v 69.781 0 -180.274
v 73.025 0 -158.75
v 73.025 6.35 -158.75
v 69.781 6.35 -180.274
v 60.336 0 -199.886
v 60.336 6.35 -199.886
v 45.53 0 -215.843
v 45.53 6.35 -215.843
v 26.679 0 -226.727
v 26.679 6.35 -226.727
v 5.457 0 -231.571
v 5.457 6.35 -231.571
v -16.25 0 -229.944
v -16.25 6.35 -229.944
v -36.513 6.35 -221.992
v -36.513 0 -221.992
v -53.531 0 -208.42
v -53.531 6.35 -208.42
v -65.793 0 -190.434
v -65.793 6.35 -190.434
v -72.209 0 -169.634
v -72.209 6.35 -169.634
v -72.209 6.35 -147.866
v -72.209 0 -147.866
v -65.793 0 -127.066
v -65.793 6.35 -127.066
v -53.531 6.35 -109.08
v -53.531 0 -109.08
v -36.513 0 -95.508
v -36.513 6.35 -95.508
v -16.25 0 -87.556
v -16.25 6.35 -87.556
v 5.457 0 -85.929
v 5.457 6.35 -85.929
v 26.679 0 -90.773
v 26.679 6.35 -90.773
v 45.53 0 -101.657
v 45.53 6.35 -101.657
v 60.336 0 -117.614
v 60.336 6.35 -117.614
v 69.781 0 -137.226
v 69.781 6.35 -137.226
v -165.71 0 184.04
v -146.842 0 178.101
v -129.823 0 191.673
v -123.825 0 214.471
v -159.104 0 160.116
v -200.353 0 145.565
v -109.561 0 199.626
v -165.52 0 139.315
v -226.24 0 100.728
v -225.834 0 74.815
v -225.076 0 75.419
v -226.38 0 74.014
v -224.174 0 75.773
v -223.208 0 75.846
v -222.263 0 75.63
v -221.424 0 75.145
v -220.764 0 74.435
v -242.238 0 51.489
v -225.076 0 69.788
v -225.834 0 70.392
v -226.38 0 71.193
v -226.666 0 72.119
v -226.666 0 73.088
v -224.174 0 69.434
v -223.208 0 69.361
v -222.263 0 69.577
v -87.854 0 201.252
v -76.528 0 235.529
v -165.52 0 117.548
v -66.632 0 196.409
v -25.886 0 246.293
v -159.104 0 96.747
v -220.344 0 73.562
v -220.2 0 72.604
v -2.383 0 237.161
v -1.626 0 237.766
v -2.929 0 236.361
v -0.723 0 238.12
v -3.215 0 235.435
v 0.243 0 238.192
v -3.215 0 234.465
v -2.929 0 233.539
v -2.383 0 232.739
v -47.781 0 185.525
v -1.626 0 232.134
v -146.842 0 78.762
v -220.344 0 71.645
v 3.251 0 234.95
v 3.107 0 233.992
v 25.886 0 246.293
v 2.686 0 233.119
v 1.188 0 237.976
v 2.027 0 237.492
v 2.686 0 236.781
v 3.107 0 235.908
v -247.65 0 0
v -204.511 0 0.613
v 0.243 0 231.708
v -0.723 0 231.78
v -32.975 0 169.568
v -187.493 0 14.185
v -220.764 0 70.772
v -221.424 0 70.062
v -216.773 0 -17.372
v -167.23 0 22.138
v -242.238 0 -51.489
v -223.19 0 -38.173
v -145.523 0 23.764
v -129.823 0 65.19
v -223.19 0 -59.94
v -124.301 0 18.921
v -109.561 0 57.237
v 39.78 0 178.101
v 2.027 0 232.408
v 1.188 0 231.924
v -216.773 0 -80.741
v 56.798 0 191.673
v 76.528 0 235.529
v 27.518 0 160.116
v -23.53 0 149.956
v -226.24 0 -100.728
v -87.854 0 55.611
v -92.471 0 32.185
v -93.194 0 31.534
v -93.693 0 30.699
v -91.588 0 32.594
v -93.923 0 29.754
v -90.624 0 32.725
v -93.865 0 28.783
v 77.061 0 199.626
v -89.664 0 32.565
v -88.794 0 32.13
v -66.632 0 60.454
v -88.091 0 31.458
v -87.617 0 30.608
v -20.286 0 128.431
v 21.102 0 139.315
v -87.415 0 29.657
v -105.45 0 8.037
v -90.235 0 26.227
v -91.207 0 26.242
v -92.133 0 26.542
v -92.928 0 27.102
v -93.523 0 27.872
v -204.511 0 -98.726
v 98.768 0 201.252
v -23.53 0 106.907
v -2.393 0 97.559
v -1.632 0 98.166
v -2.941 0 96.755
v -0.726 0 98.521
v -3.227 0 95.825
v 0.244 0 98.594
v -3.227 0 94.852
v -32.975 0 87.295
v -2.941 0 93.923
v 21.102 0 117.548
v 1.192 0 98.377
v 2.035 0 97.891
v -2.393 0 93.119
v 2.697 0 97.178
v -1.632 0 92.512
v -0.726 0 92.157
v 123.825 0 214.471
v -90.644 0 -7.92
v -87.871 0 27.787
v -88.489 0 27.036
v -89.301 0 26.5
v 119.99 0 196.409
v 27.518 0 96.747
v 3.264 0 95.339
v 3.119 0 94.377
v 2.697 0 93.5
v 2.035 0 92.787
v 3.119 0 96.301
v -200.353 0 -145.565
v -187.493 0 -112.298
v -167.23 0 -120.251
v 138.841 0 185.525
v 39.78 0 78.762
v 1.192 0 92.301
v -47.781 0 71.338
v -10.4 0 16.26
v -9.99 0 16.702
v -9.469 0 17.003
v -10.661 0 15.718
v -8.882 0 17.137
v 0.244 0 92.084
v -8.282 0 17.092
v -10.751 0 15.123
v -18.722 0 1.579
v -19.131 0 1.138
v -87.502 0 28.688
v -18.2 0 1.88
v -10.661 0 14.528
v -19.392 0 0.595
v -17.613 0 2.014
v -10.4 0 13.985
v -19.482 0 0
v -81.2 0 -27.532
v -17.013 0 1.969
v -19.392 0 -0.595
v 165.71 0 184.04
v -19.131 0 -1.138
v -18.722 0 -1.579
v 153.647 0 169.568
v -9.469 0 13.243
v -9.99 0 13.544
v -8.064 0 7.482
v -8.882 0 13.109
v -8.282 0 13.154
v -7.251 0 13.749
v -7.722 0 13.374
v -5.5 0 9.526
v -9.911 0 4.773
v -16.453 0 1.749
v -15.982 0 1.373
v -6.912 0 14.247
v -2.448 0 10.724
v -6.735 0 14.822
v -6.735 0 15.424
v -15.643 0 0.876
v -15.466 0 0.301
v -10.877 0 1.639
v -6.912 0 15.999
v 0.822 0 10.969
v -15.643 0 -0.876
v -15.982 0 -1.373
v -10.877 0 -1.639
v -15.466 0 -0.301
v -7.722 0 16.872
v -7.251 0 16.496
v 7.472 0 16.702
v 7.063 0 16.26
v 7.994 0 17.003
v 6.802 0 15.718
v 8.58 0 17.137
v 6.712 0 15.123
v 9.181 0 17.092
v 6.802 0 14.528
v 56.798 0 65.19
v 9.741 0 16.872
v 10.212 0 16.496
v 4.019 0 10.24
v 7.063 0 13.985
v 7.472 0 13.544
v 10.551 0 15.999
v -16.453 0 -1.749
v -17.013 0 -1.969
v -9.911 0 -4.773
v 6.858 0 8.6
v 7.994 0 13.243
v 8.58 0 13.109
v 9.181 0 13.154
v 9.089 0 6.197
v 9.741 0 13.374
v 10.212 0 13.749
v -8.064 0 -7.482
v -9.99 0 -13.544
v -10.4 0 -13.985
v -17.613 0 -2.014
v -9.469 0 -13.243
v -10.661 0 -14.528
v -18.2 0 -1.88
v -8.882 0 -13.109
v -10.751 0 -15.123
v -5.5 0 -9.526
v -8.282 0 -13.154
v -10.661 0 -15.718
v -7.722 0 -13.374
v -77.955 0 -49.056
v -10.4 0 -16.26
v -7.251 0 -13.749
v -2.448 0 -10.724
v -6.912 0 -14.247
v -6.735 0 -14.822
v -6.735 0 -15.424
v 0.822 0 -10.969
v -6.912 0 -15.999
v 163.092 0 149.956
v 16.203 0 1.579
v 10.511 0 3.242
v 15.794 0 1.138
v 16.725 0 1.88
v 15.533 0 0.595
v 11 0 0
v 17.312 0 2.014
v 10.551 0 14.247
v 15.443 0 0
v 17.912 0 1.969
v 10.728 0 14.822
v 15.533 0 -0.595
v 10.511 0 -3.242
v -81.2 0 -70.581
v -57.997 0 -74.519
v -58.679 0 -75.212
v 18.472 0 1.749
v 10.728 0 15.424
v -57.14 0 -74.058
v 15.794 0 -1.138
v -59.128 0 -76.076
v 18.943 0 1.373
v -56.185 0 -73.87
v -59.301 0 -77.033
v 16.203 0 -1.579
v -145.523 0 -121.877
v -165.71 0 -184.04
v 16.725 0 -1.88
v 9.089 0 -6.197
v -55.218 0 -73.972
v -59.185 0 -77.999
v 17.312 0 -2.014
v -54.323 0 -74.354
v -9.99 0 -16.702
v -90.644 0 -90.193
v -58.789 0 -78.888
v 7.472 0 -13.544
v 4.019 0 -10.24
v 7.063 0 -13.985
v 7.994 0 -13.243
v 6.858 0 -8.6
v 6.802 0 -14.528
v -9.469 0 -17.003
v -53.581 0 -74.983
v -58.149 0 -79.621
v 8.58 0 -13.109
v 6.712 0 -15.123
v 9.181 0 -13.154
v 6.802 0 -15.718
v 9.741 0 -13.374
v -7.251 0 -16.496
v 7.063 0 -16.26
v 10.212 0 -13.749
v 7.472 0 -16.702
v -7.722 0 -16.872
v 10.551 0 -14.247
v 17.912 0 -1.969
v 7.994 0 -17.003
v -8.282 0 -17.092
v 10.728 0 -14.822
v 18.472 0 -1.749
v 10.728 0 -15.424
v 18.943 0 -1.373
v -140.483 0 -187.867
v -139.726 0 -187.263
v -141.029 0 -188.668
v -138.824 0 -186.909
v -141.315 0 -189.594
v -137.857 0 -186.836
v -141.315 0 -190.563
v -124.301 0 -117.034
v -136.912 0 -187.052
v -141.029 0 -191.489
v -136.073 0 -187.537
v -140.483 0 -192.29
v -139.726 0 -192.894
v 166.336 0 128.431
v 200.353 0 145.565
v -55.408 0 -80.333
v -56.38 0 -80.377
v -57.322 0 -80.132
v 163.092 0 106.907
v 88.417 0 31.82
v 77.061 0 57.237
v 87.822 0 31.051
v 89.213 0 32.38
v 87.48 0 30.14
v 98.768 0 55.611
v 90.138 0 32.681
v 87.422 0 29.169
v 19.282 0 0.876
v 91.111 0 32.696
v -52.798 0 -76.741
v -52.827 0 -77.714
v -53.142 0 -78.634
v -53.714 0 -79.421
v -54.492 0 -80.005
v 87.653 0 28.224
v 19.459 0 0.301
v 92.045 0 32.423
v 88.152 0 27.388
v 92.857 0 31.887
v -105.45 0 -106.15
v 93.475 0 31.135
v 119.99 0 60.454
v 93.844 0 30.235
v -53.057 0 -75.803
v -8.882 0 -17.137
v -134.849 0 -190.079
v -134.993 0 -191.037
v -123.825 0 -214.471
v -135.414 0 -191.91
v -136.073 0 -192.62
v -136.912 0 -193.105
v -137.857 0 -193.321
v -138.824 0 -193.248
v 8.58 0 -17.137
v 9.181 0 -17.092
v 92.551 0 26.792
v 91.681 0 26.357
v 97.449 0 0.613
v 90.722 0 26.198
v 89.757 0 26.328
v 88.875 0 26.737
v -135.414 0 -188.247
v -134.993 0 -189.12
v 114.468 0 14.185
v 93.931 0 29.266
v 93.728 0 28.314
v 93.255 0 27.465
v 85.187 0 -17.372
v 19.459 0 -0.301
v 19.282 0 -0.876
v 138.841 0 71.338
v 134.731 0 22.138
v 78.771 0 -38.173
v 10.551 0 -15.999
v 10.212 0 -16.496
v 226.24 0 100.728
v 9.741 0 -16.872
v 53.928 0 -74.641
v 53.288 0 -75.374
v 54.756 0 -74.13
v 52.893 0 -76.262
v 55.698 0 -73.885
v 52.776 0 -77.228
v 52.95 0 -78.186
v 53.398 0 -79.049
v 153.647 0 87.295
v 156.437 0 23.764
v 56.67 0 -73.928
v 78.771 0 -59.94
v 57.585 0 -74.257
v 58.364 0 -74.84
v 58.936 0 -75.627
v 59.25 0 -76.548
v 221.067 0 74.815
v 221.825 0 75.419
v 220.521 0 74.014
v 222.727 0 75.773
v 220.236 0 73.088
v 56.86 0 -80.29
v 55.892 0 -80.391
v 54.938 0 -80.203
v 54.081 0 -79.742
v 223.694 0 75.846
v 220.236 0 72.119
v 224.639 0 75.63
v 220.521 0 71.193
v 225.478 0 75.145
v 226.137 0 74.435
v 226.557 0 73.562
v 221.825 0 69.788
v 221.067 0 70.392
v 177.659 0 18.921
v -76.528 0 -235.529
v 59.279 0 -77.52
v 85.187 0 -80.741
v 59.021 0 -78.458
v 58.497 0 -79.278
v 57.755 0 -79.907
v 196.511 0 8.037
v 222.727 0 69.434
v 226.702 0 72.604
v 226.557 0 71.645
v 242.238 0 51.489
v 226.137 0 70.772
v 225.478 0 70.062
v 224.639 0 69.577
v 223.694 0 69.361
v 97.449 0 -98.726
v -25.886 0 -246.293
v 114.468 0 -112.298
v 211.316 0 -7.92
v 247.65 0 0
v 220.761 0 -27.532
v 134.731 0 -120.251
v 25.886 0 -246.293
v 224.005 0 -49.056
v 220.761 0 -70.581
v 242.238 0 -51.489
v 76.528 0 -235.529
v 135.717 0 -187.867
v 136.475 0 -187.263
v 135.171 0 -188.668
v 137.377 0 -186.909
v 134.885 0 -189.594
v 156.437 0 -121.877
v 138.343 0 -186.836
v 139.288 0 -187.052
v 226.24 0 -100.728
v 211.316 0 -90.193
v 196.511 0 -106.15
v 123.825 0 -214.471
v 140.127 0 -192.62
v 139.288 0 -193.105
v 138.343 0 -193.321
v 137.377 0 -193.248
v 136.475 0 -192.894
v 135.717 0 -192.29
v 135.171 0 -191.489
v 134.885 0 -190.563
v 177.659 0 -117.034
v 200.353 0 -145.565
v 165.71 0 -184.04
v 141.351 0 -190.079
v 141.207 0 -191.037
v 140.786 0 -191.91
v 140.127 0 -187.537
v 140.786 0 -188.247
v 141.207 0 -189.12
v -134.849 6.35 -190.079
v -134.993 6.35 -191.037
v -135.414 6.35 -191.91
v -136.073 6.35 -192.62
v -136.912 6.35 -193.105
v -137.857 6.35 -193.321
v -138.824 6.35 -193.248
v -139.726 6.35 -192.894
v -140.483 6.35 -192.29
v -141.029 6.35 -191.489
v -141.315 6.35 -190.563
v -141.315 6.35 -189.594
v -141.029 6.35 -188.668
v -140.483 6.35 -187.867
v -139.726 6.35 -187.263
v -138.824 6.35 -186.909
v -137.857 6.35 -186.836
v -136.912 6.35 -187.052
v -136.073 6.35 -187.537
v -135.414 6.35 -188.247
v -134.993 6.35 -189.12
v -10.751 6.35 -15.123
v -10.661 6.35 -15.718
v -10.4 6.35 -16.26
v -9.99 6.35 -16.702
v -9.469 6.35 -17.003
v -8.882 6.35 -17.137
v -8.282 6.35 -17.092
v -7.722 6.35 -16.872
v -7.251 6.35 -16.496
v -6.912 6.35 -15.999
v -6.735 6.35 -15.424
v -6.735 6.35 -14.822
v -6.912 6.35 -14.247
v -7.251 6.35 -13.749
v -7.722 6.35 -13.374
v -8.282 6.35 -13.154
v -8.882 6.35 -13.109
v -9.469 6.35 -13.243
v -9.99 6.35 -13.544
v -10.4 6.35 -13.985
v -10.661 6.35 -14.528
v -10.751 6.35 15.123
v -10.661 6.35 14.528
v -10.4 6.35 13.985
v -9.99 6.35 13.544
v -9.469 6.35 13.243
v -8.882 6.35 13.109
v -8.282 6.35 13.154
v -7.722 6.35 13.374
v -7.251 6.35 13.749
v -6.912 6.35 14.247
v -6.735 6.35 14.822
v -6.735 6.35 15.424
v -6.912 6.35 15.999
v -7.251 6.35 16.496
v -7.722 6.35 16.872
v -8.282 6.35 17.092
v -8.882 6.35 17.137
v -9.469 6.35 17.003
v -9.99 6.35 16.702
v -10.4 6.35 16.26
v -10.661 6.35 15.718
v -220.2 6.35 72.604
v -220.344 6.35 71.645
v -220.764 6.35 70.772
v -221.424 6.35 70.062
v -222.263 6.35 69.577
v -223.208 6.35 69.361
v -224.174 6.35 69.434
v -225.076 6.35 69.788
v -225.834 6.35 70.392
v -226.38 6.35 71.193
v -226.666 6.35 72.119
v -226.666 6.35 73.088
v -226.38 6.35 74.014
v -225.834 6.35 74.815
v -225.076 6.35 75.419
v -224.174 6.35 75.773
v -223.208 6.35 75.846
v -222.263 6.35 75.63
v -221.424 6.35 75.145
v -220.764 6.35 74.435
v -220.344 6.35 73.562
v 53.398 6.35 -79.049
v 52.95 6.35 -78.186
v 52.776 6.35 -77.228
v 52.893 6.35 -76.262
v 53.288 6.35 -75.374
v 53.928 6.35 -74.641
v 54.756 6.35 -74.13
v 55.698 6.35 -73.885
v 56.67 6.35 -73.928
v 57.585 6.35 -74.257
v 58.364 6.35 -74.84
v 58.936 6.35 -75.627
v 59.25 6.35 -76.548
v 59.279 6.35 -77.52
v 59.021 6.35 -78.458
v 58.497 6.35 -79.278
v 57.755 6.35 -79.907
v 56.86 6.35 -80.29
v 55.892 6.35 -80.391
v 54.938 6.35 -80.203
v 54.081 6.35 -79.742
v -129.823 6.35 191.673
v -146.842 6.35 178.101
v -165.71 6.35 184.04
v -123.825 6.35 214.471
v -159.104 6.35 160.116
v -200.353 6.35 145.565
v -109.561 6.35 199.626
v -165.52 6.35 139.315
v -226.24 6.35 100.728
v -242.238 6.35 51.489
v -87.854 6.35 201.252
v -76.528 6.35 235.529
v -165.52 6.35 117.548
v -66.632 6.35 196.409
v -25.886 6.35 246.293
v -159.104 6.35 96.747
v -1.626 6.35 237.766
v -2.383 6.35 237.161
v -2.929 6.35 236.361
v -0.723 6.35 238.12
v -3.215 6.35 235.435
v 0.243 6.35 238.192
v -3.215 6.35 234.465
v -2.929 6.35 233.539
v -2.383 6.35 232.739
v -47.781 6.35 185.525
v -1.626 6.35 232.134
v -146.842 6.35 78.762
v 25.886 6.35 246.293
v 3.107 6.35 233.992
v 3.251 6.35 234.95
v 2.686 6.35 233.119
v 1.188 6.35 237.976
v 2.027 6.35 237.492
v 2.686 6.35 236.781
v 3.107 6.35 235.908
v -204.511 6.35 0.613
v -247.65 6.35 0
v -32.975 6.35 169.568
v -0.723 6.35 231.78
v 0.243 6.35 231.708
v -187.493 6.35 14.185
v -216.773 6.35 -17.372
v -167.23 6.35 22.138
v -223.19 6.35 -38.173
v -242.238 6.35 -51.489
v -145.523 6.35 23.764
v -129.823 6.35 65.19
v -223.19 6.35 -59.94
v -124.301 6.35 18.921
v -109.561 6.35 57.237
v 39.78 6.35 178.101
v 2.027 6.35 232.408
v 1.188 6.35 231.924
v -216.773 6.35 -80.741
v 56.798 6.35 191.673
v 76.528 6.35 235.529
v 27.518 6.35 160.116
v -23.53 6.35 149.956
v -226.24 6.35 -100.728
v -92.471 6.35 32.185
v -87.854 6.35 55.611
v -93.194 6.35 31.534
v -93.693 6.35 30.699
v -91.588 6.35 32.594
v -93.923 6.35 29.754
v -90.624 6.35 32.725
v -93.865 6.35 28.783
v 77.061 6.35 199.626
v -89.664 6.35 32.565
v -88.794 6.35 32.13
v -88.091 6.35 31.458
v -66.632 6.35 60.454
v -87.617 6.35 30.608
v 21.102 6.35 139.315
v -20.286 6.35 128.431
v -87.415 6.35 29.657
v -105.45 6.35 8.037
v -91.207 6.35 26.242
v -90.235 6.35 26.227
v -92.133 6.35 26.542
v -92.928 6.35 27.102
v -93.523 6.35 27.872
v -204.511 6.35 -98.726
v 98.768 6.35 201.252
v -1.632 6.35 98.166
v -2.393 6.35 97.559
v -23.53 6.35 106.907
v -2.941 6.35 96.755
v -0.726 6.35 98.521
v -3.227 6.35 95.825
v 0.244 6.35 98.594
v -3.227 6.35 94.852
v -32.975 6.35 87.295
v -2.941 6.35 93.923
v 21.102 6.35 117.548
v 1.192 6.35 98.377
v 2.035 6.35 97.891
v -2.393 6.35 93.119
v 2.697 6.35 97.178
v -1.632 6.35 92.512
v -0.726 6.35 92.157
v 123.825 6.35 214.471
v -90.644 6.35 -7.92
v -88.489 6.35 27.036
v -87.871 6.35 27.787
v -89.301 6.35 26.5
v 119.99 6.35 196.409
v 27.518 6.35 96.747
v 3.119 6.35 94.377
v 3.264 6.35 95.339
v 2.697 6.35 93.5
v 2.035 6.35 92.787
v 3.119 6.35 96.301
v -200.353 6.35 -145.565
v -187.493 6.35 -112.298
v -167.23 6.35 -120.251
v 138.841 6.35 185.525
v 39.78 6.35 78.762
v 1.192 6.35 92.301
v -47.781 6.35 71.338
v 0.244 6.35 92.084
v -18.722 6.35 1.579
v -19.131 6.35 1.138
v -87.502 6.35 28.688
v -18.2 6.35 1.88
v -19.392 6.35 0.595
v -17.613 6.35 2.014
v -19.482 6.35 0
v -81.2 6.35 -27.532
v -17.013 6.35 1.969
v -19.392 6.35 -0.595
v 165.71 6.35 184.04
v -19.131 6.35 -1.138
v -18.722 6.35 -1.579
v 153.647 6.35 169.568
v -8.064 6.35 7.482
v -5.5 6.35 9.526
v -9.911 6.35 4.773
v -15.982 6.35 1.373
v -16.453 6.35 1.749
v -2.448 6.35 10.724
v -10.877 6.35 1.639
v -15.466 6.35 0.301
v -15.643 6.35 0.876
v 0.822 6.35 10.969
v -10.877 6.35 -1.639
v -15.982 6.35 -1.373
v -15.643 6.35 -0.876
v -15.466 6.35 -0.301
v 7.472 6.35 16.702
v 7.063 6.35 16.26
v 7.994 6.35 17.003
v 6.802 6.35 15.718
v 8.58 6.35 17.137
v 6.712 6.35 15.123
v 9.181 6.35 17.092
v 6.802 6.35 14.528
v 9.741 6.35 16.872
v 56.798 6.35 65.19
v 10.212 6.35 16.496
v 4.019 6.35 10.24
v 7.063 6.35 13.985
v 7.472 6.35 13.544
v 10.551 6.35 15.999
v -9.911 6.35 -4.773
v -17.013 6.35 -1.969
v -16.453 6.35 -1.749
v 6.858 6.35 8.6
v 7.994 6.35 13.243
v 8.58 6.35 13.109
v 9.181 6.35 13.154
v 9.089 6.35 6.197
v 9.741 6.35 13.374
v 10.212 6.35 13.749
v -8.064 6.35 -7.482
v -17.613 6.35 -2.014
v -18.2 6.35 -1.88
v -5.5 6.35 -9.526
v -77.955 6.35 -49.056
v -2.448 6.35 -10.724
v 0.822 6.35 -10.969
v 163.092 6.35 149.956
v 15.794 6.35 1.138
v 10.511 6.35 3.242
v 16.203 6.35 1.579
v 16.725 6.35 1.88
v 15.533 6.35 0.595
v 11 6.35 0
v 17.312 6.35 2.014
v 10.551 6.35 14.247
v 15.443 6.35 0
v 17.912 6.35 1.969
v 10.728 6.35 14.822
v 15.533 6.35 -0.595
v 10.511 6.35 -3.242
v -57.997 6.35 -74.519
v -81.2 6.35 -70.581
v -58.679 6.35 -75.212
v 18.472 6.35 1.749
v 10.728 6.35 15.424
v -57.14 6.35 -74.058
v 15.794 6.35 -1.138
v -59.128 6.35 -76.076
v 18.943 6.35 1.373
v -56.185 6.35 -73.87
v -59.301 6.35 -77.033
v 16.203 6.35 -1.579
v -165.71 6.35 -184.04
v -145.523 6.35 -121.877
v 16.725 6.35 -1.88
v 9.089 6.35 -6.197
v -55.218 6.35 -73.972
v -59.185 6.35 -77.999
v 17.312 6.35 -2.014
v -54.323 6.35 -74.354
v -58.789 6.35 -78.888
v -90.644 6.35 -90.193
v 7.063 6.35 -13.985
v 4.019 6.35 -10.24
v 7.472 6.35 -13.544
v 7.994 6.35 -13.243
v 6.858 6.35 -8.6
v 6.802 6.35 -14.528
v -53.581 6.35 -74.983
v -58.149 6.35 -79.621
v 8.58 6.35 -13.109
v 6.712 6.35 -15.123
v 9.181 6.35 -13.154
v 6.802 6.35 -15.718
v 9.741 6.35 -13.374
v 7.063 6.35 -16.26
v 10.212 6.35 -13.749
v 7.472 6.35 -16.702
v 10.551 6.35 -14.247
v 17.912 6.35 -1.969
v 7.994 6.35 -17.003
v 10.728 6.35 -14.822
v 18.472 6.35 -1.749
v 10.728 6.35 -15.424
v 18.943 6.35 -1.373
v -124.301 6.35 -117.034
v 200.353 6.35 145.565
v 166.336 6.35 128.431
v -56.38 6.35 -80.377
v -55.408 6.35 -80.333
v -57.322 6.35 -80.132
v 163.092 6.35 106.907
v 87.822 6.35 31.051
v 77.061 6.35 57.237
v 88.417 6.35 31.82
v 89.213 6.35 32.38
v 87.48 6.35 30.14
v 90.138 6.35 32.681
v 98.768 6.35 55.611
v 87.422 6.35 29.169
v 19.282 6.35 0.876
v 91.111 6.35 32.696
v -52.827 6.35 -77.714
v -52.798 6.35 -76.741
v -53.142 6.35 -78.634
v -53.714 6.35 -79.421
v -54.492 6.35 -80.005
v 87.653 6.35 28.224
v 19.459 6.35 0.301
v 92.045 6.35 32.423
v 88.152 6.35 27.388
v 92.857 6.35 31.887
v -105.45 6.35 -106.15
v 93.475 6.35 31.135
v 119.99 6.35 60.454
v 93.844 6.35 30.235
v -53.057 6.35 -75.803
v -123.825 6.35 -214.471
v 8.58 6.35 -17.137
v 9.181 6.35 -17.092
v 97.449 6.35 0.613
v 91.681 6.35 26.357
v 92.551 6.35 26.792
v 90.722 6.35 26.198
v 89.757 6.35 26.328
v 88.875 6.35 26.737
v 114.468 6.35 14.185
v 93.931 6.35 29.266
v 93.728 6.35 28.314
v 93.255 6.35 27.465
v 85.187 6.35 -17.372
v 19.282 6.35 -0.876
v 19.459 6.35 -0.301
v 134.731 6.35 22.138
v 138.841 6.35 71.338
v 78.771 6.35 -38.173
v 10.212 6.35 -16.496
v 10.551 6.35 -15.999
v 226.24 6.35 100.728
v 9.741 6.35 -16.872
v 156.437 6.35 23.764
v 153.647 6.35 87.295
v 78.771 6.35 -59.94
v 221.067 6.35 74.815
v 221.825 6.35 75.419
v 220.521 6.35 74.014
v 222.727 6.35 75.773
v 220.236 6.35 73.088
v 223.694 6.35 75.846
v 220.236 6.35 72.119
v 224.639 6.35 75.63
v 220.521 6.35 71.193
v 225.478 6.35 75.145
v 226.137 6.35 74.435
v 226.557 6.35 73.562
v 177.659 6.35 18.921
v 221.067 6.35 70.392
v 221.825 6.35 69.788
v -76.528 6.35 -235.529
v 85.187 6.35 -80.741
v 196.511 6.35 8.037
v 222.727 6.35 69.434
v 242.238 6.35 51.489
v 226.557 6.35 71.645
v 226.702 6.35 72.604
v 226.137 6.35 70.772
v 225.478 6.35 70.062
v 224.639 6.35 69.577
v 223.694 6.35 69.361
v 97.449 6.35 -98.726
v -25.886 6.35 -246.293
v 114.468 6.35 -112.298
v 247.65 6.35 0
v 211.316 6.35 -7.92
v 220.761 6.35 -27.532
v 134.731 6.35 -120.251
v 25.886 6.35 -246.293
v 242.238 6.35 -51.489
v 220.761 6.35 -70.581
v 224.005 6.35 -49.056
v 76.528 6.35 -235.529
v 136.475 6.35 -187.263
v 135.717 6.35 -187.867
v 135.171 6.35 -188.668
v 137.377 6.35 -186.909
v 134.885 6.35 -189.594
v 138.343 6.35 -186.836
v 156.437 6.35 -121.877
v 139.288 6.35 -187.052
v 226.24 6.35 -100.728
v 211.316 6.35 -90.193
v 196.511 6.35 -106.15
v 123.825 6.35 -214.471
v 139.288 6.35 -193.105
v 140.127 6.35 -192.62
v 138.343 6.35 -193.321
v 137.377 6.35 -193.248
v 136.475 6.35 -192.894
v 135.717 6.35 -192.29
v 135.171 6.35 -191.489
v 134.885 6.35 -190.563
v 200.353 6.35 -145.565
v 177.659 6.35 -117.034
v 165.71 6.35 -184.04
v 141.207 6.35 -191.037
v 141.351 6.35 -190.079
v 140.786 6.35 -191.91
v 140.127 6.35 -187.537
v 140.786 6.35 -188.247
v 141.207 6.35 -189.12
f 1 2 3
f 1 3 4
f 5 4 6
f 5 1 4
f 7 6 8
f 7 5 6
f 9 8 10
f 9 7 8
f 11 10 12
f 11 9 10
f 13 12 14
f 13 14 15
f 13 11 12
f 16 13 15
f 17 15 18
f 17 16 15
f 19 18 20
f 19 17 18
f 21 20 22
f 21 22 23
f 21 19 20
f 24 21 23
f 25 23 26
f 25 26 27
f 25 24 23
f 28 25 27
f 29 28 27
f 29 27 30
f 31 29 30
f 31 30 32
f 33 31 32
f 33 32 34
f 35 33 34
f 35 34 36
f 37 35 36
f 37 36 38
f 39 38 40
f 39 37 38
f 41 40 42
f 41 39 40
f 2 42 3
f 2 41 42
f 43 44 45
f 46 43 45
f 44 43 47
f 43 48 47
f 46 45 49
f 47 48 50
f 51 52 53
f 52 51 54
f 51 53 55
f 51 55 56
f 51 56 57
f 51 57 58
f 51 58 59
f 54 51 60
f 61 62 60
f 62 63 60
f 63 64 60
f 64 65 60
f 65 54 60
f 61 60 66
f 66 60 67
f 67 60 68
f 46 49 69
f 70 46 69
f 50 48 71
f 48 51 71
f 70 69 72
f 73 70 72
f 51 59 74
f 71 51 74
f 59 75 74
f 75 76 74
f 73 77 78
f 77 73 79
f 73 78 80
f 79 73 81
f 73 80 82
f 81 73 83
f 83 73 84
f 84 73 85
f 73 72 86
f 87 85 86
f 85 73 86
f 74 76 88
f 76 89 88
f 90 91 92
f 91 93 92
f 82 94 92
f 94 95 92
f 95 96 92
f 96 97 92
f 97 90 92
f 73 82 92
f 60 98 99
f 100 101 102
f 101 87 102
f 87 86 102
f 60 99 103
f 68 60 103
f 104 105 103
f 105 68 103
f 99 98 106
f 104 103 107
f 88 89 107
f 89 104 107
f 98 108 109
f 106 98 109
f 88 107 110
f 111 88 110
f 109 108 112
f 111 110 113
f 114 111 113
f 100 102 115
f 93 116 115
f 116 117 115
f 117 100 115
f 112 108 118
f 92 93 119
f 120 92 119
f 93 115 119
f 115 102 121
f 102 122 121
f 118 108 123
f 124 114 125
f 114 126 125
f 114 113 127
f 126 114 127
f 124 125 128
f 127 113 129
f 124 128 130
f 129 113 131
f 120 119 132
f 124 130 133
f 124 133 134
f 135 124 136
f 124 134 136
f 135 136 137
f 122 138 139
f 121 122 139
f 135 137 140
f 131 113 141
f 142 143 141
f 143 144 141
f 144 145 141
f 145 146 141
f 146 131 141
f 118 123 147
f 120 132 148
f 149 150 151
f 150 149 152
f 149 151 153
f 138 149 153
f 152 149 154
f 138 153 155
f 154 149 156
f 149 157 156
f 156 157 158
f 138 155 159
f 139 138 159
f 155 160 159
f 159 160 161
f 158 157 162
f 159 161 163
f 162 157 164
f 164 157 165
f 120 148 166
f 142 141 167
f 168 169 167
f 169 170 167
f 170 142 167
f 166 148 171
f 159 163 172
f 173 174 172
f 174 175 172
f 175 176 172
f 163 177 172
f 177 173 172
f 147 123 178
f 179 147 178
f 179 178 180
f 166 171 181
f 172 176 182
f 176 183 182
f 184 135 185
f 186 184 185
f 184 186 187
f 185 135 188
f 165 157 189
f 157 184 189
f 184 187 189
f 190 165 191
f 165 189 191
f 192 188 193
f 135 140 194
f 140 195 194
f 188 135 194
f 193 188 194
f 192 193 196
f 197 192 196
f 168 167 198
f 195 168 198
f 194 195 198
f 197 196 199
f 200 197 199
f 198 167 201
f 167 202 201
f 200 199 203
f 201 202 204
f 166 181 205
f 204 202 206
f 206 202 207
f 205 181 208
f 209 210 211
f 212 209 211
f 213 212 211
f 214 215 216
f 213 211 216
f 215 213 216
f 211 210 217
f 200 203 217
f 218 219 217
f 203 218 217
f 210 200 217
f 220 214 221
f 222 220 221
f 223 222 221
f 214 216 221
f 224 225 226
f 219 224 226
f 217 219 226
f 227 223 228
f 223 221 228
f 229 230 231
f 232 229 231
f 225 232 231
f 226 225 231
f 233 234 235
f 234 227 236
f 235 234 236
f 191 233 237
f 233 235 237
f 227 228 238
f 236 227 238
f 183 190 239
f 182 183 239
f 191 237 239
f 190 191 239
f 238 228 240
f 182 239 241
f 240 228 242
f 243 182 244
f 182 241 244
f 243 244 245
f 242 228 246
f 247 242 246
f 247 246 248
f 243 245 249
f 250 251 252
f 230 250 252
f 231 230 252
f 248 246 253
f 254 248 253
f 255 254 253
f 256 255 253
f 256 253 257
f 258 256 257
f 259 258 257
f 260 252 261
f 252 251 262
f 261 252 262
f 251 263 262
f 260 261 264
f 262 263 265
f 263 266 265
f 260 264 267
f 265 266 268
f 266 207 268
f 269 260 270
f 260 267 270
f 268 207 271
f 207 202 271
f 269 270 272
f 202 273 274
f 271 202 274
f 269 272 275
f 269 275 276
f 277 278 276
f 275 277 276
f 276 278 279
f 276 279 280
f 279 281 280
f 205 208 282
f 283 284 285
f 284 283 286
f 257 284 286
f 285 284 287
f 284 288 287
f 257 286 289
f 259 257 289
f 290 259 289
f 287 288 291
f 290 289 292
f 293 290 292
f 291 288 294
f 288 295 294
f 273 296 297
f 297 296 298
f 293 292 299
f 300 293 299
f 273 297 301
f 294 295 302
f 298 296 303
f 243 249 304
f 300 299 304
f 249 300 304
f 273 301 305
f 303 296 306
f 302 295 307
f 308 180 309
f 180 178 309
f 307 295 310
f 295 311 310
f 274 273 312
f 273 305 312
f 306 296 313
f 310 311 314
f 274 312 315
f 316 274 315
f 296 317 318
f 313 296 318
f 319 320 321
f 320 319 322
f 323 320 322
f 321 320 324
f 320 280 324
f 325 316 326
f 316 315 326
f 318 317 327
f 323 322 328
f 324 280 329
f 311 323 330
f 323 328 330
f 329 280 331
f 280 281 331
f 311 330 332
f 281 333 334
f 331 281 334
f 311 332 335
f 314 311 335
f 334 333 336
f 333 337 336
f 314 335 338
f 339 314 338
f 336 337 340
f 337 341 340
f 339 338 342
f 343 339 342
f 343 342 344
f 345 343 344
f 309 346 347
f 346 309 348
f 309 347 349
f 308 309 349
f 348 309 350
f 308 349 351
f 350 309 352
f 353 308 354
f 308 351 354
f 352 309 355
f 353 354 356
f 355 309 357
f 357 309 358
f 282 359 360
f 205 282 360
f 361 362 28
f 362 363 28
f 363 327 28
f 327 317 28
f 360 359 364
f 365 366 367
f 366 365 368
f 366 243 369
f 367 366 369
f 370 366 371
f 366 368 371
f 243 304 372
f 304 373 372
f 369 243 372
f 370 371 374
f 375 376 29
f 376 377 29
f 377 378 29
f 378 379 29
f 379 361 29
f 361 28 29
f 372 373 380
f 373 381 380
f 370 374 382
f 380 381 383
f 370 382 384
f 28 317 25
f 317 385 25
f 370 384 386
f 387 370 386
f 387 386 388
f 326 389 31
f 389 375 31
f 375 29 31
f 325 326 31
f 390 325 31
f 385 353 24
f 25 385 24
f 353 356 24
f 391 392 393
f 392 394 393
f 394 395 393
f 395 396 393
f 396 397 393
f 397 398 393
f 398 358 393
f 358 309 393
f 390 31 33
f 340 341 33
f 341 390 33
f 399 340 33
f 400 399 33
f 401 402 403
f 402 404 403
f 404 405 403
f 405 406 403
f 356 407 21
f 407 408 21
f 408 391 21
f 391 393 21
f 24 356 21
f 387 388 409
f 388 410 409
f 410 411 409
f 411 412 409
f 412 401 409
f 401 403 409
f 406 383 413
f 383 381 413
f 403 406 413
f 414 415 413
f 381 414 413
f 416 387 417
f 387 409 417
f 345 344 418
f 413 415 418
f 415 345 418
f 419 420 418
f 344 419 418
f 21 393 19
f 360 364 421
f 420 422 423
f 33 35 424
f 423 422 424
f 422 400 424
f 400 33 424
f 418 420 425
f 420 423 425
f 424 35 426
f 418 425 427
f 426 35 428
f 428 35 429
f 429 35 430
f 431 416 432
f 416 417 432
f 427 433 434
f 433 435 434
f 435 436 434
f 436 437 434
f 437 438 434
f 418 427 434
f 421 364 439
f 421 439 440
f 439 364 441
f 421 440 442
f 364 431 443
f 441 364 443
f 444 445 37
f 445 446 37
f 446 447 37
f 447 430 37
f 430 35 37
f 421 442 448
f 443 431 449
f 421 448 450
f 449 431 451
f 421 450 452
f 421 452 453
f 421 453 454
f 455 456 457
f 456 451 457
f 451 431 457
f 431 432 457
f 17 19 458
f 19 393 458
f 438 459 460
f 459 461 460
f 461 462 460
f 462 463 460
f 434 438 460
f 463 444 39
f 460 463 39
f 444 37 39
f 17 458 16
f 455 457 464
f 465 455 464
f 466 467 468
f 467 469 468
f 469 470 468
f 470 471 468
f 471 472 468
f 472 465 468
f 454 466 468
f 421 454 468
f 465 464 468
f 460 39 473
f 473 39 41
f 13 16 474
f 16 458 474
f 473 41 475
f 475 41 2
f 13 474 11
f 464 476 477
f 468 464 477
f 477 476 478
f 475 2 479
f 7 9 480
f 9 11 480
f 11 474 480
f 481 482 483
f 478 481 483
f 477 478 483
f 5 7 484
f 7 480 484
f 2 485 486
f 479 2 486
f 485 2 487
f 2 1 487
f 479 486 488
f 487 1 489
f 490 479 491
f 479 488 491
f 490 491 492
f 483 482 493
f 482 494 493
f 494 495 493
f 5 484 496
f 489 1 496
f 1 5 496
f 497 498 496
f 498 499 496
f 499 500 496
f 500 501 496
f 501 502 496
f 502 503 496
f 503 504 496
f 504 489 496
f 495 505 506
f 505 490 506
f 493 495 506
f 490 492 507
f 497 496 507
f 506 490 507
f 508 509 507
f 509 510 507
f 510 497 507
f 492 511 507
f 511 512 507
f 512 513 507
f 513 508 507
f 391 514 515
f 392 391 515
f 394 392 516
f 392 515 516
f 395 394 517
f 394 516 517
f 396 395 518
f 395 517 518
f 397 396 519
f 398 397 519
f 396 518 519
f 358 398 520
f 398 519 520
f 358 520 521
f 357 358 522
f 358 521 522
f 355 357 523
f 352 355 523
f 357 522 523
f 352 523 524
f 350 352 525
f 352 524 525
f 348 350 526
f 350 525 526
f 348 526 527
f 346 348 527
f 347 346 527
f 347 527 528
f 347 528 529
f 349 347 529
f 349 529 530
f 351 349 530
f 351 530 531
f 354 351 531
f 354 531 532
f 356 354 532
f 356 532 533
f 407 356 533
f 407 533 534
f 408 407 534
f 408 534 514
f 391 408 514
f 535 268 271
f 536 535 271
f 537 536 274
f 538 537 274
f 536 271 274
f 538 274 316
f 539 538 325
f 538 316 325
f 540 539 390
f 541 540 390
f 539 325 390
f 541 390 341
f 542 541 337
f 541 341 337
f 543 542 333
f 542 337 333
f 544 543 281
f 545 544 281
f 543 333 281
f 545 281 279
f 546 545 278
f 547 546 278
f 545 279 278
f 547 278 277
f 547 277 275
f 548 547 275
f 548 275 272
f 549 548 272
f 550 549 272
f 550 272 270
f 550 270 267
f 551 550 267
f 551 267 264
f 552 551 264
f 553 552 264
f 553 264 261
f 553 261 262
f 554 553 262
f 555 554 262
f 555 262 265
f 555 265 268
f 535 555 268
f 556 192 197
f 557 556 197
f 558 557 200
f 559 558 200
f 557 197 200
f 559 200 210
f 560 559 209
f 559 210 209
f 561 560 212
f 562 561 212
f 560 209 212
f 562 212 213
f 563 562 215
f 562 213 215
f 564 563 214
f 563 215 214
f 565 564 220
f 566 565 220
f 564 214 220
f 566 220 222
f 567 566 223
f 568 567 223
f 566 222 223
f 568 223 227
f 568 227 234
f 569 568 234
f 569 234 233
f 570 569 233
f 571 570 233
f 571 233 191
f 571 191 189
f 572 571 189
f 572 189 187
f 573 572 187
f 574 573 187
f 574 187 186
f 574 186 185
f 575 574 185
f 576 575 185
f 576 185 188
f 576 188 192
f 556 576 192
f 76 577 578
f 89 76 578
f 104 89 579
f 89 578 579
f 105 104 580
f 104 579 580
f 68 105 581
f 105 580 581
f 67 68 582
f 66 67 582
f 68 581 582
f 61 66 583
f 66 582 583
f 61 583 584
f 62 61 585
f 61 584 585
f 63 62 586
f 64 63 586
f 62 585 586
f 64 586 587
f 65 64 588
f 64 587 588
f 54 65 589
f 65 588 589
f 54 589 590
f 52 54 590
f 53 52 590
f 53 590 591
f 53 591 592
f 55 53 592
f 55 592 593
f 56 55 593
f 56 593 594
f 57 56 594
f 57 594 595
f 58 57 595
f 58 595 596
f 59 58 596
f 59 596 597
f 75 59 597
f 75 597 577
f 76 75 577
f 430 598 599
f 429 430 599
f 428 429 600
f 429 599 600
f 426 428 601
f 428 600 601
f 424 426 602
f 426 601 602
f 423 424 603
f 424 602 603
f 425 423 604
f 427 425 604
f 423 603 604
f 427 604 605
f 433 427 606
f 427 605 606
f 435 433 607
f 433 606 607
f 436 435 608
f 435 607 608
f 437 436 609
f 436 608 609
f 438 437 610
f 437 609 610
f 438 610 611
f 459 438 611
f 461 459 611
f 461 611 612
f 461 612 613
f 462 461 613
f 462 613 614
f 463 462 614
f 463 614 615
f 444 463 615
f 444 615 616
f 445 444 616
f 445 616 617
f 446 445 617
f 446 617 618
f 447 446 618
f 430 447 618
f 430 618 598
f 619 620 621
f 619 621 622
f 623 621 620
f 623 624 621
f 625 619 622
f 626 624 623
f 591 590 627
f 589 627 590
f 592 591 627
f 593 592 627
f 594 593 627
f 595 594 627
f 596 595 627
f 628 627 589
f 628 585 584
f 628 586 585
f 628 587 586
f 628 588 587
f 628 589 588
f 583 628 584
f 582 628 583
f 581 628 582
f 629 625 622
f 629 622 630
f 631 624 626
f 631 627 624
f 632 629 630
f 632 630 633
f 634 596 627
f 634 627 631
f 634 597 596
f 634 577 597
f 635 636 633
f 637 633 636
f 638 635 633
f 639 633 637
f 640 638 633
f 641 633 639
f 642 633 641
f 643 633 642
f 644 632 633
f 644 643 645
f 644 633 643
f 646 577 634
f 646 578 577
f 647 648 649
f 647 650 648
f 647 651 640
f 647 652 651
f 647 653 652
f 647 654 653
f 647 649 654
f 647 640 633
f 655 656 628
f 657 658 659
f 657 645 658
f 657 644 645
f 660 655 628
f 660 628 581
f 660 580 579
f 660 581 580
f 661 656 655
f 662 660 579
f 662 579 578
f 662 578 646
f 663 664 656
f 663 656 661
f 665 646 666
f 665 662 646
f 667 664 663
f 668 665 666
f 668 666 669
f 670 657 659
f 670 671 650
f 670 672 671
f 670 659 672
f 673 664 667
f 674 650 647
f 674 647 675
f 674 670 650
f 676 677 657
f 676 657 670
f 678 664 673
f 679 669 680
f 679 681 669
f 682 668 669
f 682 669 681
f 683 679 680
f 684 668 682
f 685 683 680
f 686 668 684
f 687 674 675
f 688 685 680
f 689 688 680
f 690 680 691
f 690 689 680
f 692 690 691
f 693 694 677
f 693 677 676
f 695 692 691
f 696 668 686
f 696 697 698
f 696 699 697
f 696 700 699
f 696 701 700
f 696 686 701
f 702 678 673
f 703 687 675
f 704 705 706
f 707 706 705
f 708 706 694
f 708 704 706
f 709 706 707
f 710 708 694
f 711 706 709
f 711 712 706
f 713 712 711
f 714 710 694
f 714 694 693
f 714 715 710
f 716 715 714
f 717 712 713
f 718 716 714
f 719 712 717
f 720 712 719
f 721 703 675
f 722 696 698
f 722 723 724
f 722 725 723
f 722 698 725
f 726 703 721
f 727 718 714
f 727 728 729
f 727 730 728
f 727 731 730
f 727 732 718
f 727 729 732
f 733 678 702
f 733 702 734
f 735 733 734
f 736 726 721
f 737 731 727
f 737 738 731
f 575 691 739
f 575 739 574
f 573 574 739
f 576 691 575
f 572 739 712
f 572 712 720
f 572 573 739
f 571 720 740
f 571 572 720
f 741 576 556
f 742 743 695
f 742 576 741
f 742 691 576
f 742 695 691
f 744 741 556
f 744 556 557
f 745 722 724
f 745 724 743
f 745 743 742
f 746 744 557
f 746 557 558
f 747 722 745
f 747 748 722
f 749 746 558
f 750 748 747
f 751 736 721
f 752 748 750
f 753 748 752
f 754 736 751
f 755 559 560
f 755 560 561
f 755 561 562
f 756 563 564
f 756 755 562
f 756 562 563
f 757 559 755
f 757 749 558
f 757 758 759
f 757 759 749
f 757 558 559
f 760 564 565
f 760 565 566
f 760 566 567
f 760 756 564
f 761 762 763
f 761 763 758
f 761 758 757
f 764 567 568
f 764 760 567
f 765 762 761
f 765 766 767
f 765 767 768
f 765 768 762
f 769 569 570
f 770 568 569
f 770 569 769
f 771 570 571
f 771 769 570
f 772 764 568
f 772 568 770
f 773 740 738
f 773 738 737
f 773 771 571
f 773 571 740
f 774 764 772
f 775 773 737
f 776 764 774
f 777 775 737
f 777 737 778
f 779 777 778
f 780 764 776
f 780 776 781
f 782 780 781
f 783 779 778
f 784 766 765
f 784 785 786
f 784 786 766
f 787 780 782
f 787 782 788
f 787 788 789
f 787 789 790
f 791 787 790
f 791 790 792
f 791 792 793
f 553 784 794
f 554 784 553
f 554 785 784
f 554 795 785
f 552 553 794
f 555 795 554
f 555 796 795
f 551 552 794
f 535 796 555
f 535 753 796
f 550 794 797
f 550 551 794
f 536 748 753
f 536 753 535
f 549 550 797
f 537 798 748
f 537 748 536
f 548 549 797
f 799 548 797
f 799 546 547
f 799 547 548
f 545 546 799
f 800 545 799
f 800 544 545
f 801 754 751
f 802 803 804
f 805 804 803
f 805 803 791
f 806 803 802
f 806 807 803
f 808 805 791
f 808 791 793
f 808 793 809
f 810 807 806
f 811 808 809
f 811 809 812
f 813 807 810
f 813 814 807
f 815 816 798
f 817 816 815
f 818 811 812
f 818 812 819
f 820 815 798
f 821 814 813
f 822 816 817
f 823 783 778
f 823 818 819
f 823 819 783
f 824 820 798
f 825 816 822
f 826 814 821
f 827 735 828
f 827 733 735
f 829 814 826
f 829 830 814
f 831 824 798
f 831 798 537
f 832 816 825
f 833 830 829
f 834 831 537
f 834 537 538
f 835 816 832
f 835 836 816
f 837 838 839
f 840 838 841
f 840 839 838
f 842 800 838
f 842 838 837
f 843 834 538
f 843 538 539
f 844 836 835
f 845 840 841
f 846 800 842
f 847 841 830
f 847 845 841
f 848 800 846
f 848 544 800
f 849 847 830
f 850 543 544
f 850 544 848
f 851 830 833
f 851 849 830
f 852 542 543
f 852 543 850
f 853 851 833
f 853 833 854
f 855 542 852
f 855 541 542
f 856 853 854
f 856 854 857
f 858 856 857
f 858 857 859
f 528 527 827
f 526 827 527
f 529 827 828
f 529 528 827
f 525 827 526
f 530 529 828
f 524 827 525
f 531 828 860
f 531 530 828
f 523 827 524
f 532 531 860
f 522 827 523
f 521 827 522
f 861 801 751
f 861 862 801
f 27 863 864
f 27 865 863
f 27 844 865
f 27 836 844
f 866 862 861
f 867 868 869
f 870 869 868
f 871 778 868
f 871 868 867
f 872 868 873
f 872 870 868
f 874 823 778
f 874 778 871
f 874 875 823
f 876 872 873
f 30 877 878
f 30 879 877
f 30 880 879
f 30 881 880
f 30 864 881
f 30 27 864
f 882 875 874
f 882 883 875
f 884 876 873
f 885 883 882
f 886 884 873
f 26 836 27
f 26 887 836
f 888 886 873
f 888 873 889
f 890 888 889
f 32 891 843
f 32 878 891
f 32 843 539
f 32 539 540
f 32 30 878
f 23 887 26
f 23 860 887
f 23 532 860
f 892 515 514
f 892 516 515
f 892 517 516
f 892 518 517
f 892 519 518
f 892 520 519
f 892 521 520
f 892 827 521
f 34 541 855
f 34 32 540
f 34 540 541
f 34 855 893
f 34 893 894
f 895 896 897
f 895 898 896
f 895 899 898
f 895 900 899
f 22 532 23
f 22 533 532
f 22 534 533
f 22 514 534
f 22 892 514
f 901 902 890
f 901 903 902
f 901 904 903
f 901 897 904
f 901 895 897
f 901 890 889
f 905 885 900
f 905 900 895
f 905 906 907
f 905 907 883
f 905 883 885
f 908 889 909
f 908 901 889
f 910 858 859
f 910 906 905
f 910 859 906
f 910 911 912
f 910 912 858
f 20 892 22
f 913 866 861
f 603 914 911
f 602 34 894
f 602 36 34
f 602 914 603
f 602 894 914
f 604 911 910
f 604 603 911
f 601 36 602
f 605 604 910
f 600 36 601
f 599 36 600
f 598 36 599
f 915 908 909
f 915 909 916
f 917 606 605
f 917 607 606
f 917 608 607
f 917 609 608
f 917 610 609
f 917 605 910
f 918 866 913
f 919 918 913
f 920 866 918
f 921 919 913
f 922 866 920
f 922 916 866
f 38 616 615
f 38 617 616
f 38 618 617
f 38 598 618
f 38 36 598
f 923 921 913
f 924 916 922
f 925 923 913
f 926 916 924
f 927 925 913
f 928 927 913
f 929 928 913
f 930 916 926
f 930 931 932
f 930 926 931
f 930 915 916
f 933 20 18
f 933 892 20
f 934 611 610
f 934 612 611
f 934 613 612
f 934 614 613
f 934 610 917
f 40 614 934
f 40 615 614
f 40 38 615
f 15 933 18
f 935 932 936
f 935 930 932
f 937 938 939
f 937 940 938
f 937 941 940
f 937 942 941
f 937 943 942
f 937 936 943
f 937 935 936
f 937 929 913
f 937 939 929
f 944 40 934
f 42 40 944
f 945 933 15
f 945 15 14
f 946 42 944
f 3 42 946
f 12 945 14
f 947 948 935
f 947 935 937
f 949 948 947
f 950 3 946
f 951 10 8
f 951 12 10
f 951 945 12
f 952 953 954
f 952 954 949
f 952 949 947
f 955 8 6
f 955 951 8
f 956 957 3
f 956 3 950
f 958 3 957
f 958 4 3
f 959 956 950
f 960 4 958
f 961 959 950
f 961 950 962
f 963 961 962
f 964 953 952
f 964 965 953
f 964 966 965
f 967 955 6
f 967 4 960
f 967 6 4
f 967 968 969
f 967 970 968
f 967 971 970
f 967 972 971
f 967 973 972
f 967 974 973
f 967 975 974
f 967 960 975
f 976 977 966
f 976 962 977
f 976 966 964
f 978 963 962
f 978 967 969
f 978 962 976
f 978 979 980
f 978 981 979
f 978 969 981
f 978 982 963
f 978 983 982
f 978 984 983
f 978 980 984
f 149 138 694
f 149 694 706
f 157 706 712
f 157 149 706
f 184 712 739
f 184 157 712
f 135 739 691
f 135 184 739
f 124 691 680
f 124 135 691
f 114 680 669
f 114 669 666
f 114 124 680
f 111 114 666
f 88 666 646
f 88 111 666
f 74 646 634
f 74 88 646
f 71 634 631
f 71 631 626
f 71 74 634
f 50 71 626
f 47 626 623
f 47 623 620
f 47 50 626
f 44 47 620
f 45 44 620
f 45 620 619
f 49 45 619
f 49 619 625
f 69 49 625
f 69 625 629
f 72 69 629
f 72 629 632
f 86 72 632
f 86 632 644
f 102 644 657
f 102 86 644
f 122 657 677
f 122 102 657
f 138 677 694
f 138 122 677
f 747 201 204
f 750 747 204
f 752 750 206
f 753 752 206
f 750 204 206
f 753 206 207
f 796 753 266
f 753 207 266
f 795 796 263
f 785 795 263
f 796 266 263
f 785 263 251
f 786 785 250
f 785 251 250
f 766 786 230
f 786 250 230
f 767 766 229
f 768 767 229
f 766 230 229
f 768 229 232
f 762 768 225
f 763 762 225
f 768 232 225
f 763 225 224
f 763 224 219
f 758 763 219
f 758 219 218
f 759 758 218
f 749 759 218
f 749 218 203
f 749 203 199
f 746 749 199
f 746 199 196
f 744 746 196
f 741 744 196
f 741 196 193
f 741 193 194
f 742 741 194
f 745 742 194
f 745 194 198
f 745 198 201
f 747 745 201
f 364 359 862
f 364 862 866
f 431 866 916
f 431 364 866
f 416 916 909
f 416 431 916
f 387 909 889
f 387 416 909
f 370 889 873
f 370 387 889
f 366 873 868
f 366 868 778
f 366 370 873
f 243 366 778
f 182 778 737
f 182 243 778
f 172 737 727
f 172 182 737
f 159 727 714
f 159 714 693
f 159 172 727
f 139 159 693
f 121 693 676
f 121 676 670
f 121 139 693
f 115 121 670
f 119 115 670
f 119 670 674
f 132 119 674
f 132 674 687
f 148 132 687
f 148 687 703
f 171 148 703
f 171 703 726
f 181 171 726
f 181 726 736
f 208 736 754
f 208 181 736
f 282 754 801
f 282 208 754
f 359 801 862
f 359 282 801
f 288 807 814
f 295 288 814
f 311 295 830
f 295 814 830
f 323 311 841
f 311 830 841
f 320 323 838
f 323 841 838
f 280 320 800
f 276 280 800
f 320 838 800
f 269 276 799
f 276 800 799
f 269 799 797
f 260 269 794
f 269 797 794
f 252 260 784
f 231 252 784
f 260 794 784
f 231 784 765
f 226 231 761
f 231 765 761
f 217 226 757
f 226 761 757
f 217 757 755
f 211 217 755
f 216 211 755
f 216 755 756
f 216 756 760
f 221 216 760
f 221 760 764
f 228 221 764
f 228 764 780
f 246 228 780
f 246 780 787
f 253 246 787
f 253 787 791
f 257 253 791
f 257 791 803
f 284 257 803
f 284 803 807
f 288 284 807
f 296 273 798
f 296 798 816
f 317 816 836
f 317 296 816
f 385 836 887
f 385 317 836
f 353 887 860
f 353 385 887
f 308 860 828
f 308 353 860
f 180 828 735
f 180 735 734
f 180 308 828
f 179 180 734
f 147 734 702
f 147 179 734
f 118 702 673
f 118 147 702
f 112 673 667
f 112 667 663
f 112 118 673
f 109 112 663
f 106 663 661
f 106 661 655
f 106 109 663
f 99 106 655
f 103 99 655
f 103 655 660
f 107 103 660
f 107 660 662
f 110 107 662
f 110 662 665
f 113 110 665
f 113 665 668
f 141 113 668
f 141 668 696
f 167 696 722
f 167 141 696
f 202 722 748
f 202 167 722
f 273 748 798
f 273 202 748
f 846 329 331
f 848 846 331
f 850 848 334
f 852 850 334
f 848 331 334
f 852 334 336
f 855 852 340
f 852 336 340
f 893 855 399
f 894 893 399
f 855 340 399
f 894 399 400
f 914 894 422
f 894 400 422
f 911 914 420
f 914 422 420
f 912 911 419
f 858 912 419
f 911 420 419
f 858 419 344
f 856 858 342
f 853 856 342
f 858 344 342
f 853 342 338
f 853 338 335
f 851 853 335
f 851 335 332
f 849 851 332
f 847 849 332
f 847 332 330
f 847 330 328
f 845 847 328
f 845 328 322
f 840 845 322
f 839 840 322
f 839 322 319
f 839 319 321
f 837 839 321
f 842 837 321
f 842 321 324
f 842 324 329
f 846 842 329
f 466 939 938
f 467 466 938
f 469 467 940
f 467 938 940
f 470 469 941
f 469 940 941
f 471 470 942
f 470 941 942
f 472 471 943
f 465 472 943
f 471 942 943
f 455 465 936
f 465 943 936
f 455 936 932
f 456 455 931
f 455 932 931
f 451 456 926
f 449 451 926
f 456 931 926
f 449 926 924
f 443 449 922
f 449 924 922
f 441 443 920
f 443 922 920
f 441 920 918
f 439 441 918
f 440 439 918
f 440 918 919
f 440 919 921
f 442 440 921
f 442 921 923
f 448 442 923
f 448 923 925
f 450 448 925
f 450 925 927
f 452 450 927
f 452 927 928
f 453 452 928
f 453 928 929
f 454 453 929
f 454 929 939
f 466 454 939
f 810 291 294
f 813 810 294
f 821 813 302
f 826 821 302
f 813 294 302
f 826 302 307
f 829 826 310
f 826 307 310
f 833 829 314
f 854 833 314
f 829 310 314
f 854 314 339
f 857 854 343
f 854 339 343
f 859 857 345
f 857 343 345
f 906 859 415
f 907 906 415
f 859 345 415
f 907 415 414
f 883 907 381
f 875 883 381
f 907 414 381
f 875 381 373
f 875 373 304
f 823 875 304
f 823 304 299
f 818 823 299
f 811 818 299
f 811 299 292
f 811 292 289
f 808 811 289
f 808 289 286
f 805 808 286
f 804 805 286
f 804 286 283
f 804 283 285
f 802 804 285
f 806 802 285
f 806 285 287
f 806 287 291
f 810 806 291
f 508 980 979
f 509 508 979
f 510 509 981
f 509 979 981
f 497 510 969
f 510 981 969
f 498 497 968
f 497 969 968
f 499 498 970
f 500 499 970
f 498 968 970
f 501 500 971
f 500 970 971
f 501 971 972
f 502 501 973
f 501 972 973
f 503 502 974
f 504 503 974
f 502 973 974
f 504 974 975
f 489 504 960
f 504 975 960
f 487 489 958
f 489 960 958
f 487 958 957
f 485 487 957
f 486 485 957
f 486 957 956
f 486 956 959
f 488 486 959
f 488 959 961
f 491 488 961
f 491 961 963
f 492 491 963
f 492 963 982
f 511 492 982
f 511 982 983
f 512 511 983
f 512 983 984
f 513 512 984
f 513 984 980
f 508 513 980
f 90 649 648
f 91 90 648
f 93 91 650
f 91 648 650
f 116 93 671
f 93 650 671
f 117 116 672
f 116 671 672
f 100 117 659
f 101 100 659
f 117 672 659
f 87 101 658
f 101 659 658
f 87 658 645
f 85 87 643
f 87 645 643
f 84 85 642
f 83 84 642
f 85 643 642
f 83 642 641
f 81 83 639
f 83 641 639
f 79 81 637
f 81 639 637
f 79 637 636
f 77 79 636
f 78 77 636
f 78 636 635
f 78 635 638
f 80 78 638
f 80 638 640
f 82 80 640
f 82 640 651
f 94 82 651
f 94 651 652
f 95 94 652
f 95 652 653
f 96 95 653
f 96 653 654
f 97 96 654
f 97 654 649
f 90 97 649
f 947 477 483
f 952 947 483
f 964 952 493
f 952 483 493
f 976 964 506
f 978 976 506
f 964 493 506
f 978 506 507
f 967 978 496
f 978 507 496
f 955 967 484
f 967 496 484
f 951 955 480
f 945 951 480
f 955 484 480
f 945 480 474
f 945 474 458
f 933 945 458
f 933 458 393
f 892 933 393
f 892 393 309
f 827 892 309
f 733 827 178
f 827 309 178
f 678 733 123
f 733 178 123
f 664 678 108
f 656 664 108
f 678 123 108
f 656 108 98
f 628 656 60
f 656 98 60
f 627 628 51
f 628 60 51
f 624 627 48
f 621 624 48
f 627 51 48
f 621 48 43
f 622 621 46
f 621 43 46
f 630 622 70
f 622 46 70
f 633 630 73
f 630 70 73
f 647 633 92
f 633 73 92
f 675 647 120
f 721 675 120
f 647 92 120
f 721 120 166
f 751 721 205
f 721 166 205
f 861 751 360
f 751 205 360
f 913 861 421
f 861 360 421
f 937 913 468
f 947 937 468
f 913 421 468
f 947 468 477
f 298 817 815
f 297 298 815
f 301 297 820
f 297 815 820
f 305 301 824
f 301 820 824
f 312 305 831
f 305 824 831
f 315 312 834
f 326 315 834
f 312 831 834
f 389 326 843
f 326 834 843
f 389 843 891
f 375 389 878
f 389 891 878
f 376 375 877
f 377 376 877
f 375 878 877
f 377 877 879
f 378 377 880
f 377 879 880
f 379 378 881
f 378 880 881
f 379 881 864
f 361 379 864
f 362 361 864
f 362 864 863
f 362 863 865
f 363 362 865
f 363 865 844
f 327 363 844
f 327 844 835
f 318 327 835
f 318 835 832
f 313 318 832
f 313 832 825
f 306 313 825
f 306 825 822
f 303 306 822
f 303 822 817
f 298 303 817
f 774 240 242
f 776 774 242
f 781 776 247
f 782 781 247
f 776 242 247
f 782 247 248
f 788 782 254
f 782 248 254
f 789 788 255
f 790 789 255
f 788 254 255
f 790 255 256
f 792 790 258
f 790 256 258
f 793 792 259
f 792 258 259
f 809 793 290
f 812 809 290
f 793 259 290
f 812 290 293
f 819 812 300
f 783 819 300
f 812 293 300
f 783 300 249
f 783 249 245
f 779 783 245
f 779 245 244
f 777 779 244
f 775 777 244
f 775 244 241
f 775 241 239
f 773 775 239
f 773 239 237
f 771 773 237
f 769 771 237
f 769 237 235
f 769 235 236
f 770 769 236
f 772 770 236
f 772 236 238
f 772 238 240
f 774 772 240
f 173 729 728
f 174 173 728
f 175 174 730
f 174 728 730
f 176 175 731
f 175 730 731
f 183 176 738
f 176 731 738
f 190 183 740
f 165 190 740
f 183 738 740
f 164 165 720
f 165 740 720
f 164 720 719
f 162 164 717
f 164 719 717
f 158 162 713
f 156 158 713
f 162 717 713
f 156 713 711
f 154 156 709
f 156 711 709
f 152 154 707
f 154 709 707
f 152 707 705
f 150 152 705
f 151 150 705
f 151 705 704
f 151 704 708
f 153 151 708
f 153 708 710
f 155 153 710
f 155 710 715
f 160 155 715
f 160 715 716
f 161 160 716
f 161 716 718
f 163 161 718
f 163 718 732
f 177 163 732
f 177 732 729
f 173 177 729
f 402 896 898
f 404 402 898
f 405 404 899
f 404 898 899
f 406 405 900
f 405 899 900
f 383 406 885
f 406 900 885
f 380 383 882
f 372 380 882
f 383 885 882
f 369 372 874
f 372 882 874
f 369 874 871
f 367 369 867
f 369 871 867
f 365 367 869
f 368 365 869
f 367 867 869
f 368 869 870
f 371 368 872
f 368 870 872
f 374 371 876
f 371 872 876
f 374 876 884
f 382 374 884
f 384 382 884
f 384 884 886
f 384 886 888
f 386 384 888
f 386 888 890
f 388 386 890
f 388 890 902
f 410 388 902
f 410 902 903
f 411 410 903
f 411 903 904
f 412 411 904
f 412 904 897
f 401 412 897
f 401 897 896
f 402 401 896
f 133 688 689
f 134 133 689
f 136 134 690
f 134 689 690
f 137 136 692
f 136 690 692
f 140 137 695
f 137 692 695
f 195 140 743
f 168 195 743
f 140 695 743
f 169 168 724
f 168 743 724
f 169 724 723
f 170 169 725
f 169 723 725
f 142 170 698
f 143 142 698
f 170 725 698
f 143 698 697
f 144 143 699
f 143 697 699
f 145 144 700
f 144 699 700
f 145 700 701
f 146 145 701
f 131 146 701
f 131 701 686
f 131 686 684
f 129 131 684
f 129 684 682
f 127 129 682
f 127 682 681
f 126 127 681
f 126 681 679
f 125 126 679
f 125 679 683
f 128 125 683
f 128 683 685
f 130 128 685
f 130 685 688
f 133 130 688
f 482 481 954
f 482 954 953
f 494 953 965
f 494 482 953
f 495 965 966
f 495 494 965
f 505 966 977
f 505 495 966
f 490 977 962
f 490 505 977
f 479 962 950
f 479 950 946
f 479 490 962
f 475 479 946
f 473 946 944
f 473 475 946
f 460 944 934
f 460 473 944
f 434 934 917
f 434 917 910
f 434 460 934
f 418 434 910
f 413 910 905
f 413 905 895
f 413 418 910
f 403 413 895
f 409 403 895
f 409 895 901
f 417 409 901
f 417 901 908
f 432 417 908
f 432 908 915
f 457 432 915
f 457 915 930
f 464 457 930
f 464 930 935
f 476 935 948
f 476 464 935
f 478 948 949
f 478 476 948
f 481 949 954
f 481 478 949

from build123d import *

# Parameters (mm, degrees)
SKETCH1_R              = 247.65
SKETCH1_R_2            = 73.025
BOSS_EXTRUDE1_DEPTH    = 6.35
SKETCH3_R              = 11
CUT_EXTRUDE1_DEPTH     = 7.35
F_10_32_TAPPED_HOLE1_D = 4.0386
SKETCH8_R              = 3.2512
CUT_EXTRUDE2_DEPTH     = 7.35
SKETCH9_R              = 3.2639
CUT_EXTRUDE3_DEPTH     = 7.35
CIRPATTERN1_COUNT      = 5


with BuildPart() as part:
    # Sketch1 → Boss-Extrude1 (new body)
    with BuildSketch(Plane(origin=(0, 0, 0), x_dir=(1, 0, 0), z_dir=(0, 1, 0))):
        Circle(SKETCH1_R)
        with Locations((0, 158.75)):
            Circle(SKETCH1_R_2, mode=Mode.SUBTRACT)
        with Locations((150.980221962, 49.056447857)):
            Circle(SKETCH1_R_2, mode=Mode.SUBTRACT)
        with Locations((93.310908801, -128.431447857)):
            Circle(SKETCH1_R_2, mode=Mode.SUBTRACT)
        with Locations((-93.310908801, -128.431447857)):
            Circle(SKETCH1_R_2, mode=Mode.SUBTRACT)
        with Locations((-150.980221962, 49.056447857)):
            Circle(SKETCH1_R_2, mode=Mode.SUBTRACT)
    extrude(amount=BOSS_EXTRUDE1_DEPTH)

    # Sketch3 → Cut-Extrude1 (cut, through all)
    with BuildSketch(Plane(origin=(-5.184519995, 6.35, -2.448578058), x_dir=(1, 0, 0), z_dir=(0, 1, 0))):
        with Locations((5.184519995, -2.448578058)):
            Circle(SKETCH3_R)
    extrude(amount=-CUT_EXTRUDE1_DEPTH, mode=Mode.SUBTRACT)

    # #10-32 Tapped Hole1 (through all)
    with Locations(Plane(origin=(-5.184519995, 6.35, -2.448578058), x_dir=(1, 0, 0), z_dir=(0, 1, 0))):
        with Locations((-3.546730005, 12.674390556), (13.915769995, 12.674390556), (22.647019995, -2.448578058), (13.915769995, -17.571546671), (-3.546730005, -17.571546671), (-12.277980005, -2.448578058)):
            Hole(F_10_32_TAPPED_HOLE1_D / 2)

    # Sketch8 → Cut-Extrude2 (cut, through all)
    with BuildSketch(Plane(origin=(0, 6.35, 0), x_dir=(1, 0, 0), z_dir=(0, 1, 0))):
        with Locations((0, -234.95)):
            Circle(SKETCH8_R)
        with Locations((-223.450728504, -72.603542828)):
            Circle(SKETCH8_R)
        with Locations((-138.100145026, 190.078542828)):
            Circle(SKETCH8_R)
        with Locations((138.100145026, 190.078542828)):
            Circle(SKETCH8_R)
        with Locations((223.450728504, -72.603542828)):
            Circle(SKETCH8_R)
    extrude(amount=-CUT_EXTRUDE2_DEPTH, mode=Mode.SUBTRACT)

    # Sketch9 → Cut-Extrude3 (cut, through all)
    with BuildSketch(Plane(origin=(0, 6.35, 0), x_dir=(1, 0, 0), z_dir=(0, 1, 0))):
        with Locations((0, -95.3389)):
            Circle(SKETCH9_R)
    cut_extrude3 = extrude(amount=-CUT_EXTRUDE3_DEPTH, mode=Mode.SUBTRACT)

    # CirPattern1: Cut-Extrude3 ×5 about axis
    cirpattern1_axis = Axis((0, 0, 0), (0, 1, 0))
    for i in range(1, CIRPATTERN1_COUNT):
        add(cut_extrude3.rotate(cirpattern1_axis, i * 360 / CIRPATTERN1_COUNT), mode=Mode.SUBTRACT)


solid = part.part
